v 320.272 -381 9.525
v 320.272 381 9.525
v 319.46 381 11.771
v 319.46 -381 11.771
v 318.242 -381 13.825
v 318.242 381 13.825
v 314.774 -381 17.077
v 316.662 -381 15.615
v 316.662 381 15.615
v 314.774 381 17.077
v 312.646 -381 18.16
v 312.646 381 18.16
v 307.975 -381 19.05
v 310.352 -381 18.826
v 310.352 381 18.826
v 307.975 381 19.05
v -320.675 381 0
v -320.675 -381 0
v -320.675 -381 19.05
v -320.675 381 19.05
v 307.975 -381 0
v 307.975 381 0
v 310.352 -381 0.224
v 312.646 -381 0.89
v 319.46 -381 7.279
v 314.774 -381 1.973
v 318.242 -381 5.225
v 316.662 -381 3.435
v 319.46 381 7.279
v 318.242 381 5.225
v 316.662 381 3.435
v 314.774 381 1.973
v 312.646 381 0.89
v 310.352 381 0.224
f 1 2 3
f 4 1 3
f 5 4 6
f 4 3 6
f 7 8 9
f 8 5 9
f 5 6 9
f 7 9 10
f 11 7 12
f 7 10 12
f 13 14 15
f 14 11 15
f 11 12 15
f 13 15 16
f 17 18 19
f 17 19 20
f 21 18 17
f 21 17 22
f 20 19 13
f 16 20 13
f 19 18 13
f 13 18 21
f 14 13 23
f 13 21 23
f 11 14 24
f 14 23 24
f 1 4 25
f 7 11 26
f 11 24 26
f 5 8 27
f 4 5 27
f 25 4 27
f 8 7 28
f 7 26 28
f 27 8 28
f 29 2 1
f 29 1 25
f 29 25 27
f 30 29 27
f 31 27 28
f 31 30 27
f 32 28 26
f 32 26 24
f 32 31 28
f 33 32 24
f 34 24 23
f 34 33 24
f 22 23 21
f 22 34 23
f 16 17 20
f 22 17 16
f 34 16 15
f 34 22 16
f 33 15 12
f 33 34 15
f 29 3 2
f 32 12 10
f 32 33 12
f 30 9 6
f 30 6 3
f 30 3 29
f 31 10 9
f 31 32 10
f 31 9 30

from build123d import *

# Parameters (mm, degrees)
F0_W        = 641.35
F0_H        = 762
F1_DEPTH    = 19.05
F2_T1_DEPTH = 825.5


# Not quite as in the source:
# - a fillet or chamfer that OpenCascade refuses, or shapes differently, is made with other operations: its cross-section is extruded or revolved along the edge and cut away or added


with BuildPart() as f1:
    # F0 (on Top) → F1 (new body)
    with BuildSketch(Plane.XY):
        Rectangle(F0_W, F0_H)
    extrude(amount=F1_DEPTH)

    # F2: fillet of radius 12.7 on 2 edges, made by hand

    # F2_s2 → F2_t1 (cut)
    with BuildSketch(Plane.XZ.offset(-412.75)):
        with BuildLine():
            ThreePointArc((320.675, 6.35), (316.9552561211, 15.3302561211), (307.975, 19.05))
            Line((307.975, 19.05), (320.675, 19.05))
            Line((320.675, 19.05), (320.675, 6.35))
        make_face()
        with BuildLine():
            ThreePointArc((320.675, 12.7), (316.9552561211, 3.7197438789), (307.975, 0))
            Line((307.975, 0), (320.675, 0))
            Line((320.675, 0), (320.675, 12.7))
        make_face()
    extrude(amount=F2_T1_DEPTH, mode=Mode.SUBTRACT)


solid = f1.part
